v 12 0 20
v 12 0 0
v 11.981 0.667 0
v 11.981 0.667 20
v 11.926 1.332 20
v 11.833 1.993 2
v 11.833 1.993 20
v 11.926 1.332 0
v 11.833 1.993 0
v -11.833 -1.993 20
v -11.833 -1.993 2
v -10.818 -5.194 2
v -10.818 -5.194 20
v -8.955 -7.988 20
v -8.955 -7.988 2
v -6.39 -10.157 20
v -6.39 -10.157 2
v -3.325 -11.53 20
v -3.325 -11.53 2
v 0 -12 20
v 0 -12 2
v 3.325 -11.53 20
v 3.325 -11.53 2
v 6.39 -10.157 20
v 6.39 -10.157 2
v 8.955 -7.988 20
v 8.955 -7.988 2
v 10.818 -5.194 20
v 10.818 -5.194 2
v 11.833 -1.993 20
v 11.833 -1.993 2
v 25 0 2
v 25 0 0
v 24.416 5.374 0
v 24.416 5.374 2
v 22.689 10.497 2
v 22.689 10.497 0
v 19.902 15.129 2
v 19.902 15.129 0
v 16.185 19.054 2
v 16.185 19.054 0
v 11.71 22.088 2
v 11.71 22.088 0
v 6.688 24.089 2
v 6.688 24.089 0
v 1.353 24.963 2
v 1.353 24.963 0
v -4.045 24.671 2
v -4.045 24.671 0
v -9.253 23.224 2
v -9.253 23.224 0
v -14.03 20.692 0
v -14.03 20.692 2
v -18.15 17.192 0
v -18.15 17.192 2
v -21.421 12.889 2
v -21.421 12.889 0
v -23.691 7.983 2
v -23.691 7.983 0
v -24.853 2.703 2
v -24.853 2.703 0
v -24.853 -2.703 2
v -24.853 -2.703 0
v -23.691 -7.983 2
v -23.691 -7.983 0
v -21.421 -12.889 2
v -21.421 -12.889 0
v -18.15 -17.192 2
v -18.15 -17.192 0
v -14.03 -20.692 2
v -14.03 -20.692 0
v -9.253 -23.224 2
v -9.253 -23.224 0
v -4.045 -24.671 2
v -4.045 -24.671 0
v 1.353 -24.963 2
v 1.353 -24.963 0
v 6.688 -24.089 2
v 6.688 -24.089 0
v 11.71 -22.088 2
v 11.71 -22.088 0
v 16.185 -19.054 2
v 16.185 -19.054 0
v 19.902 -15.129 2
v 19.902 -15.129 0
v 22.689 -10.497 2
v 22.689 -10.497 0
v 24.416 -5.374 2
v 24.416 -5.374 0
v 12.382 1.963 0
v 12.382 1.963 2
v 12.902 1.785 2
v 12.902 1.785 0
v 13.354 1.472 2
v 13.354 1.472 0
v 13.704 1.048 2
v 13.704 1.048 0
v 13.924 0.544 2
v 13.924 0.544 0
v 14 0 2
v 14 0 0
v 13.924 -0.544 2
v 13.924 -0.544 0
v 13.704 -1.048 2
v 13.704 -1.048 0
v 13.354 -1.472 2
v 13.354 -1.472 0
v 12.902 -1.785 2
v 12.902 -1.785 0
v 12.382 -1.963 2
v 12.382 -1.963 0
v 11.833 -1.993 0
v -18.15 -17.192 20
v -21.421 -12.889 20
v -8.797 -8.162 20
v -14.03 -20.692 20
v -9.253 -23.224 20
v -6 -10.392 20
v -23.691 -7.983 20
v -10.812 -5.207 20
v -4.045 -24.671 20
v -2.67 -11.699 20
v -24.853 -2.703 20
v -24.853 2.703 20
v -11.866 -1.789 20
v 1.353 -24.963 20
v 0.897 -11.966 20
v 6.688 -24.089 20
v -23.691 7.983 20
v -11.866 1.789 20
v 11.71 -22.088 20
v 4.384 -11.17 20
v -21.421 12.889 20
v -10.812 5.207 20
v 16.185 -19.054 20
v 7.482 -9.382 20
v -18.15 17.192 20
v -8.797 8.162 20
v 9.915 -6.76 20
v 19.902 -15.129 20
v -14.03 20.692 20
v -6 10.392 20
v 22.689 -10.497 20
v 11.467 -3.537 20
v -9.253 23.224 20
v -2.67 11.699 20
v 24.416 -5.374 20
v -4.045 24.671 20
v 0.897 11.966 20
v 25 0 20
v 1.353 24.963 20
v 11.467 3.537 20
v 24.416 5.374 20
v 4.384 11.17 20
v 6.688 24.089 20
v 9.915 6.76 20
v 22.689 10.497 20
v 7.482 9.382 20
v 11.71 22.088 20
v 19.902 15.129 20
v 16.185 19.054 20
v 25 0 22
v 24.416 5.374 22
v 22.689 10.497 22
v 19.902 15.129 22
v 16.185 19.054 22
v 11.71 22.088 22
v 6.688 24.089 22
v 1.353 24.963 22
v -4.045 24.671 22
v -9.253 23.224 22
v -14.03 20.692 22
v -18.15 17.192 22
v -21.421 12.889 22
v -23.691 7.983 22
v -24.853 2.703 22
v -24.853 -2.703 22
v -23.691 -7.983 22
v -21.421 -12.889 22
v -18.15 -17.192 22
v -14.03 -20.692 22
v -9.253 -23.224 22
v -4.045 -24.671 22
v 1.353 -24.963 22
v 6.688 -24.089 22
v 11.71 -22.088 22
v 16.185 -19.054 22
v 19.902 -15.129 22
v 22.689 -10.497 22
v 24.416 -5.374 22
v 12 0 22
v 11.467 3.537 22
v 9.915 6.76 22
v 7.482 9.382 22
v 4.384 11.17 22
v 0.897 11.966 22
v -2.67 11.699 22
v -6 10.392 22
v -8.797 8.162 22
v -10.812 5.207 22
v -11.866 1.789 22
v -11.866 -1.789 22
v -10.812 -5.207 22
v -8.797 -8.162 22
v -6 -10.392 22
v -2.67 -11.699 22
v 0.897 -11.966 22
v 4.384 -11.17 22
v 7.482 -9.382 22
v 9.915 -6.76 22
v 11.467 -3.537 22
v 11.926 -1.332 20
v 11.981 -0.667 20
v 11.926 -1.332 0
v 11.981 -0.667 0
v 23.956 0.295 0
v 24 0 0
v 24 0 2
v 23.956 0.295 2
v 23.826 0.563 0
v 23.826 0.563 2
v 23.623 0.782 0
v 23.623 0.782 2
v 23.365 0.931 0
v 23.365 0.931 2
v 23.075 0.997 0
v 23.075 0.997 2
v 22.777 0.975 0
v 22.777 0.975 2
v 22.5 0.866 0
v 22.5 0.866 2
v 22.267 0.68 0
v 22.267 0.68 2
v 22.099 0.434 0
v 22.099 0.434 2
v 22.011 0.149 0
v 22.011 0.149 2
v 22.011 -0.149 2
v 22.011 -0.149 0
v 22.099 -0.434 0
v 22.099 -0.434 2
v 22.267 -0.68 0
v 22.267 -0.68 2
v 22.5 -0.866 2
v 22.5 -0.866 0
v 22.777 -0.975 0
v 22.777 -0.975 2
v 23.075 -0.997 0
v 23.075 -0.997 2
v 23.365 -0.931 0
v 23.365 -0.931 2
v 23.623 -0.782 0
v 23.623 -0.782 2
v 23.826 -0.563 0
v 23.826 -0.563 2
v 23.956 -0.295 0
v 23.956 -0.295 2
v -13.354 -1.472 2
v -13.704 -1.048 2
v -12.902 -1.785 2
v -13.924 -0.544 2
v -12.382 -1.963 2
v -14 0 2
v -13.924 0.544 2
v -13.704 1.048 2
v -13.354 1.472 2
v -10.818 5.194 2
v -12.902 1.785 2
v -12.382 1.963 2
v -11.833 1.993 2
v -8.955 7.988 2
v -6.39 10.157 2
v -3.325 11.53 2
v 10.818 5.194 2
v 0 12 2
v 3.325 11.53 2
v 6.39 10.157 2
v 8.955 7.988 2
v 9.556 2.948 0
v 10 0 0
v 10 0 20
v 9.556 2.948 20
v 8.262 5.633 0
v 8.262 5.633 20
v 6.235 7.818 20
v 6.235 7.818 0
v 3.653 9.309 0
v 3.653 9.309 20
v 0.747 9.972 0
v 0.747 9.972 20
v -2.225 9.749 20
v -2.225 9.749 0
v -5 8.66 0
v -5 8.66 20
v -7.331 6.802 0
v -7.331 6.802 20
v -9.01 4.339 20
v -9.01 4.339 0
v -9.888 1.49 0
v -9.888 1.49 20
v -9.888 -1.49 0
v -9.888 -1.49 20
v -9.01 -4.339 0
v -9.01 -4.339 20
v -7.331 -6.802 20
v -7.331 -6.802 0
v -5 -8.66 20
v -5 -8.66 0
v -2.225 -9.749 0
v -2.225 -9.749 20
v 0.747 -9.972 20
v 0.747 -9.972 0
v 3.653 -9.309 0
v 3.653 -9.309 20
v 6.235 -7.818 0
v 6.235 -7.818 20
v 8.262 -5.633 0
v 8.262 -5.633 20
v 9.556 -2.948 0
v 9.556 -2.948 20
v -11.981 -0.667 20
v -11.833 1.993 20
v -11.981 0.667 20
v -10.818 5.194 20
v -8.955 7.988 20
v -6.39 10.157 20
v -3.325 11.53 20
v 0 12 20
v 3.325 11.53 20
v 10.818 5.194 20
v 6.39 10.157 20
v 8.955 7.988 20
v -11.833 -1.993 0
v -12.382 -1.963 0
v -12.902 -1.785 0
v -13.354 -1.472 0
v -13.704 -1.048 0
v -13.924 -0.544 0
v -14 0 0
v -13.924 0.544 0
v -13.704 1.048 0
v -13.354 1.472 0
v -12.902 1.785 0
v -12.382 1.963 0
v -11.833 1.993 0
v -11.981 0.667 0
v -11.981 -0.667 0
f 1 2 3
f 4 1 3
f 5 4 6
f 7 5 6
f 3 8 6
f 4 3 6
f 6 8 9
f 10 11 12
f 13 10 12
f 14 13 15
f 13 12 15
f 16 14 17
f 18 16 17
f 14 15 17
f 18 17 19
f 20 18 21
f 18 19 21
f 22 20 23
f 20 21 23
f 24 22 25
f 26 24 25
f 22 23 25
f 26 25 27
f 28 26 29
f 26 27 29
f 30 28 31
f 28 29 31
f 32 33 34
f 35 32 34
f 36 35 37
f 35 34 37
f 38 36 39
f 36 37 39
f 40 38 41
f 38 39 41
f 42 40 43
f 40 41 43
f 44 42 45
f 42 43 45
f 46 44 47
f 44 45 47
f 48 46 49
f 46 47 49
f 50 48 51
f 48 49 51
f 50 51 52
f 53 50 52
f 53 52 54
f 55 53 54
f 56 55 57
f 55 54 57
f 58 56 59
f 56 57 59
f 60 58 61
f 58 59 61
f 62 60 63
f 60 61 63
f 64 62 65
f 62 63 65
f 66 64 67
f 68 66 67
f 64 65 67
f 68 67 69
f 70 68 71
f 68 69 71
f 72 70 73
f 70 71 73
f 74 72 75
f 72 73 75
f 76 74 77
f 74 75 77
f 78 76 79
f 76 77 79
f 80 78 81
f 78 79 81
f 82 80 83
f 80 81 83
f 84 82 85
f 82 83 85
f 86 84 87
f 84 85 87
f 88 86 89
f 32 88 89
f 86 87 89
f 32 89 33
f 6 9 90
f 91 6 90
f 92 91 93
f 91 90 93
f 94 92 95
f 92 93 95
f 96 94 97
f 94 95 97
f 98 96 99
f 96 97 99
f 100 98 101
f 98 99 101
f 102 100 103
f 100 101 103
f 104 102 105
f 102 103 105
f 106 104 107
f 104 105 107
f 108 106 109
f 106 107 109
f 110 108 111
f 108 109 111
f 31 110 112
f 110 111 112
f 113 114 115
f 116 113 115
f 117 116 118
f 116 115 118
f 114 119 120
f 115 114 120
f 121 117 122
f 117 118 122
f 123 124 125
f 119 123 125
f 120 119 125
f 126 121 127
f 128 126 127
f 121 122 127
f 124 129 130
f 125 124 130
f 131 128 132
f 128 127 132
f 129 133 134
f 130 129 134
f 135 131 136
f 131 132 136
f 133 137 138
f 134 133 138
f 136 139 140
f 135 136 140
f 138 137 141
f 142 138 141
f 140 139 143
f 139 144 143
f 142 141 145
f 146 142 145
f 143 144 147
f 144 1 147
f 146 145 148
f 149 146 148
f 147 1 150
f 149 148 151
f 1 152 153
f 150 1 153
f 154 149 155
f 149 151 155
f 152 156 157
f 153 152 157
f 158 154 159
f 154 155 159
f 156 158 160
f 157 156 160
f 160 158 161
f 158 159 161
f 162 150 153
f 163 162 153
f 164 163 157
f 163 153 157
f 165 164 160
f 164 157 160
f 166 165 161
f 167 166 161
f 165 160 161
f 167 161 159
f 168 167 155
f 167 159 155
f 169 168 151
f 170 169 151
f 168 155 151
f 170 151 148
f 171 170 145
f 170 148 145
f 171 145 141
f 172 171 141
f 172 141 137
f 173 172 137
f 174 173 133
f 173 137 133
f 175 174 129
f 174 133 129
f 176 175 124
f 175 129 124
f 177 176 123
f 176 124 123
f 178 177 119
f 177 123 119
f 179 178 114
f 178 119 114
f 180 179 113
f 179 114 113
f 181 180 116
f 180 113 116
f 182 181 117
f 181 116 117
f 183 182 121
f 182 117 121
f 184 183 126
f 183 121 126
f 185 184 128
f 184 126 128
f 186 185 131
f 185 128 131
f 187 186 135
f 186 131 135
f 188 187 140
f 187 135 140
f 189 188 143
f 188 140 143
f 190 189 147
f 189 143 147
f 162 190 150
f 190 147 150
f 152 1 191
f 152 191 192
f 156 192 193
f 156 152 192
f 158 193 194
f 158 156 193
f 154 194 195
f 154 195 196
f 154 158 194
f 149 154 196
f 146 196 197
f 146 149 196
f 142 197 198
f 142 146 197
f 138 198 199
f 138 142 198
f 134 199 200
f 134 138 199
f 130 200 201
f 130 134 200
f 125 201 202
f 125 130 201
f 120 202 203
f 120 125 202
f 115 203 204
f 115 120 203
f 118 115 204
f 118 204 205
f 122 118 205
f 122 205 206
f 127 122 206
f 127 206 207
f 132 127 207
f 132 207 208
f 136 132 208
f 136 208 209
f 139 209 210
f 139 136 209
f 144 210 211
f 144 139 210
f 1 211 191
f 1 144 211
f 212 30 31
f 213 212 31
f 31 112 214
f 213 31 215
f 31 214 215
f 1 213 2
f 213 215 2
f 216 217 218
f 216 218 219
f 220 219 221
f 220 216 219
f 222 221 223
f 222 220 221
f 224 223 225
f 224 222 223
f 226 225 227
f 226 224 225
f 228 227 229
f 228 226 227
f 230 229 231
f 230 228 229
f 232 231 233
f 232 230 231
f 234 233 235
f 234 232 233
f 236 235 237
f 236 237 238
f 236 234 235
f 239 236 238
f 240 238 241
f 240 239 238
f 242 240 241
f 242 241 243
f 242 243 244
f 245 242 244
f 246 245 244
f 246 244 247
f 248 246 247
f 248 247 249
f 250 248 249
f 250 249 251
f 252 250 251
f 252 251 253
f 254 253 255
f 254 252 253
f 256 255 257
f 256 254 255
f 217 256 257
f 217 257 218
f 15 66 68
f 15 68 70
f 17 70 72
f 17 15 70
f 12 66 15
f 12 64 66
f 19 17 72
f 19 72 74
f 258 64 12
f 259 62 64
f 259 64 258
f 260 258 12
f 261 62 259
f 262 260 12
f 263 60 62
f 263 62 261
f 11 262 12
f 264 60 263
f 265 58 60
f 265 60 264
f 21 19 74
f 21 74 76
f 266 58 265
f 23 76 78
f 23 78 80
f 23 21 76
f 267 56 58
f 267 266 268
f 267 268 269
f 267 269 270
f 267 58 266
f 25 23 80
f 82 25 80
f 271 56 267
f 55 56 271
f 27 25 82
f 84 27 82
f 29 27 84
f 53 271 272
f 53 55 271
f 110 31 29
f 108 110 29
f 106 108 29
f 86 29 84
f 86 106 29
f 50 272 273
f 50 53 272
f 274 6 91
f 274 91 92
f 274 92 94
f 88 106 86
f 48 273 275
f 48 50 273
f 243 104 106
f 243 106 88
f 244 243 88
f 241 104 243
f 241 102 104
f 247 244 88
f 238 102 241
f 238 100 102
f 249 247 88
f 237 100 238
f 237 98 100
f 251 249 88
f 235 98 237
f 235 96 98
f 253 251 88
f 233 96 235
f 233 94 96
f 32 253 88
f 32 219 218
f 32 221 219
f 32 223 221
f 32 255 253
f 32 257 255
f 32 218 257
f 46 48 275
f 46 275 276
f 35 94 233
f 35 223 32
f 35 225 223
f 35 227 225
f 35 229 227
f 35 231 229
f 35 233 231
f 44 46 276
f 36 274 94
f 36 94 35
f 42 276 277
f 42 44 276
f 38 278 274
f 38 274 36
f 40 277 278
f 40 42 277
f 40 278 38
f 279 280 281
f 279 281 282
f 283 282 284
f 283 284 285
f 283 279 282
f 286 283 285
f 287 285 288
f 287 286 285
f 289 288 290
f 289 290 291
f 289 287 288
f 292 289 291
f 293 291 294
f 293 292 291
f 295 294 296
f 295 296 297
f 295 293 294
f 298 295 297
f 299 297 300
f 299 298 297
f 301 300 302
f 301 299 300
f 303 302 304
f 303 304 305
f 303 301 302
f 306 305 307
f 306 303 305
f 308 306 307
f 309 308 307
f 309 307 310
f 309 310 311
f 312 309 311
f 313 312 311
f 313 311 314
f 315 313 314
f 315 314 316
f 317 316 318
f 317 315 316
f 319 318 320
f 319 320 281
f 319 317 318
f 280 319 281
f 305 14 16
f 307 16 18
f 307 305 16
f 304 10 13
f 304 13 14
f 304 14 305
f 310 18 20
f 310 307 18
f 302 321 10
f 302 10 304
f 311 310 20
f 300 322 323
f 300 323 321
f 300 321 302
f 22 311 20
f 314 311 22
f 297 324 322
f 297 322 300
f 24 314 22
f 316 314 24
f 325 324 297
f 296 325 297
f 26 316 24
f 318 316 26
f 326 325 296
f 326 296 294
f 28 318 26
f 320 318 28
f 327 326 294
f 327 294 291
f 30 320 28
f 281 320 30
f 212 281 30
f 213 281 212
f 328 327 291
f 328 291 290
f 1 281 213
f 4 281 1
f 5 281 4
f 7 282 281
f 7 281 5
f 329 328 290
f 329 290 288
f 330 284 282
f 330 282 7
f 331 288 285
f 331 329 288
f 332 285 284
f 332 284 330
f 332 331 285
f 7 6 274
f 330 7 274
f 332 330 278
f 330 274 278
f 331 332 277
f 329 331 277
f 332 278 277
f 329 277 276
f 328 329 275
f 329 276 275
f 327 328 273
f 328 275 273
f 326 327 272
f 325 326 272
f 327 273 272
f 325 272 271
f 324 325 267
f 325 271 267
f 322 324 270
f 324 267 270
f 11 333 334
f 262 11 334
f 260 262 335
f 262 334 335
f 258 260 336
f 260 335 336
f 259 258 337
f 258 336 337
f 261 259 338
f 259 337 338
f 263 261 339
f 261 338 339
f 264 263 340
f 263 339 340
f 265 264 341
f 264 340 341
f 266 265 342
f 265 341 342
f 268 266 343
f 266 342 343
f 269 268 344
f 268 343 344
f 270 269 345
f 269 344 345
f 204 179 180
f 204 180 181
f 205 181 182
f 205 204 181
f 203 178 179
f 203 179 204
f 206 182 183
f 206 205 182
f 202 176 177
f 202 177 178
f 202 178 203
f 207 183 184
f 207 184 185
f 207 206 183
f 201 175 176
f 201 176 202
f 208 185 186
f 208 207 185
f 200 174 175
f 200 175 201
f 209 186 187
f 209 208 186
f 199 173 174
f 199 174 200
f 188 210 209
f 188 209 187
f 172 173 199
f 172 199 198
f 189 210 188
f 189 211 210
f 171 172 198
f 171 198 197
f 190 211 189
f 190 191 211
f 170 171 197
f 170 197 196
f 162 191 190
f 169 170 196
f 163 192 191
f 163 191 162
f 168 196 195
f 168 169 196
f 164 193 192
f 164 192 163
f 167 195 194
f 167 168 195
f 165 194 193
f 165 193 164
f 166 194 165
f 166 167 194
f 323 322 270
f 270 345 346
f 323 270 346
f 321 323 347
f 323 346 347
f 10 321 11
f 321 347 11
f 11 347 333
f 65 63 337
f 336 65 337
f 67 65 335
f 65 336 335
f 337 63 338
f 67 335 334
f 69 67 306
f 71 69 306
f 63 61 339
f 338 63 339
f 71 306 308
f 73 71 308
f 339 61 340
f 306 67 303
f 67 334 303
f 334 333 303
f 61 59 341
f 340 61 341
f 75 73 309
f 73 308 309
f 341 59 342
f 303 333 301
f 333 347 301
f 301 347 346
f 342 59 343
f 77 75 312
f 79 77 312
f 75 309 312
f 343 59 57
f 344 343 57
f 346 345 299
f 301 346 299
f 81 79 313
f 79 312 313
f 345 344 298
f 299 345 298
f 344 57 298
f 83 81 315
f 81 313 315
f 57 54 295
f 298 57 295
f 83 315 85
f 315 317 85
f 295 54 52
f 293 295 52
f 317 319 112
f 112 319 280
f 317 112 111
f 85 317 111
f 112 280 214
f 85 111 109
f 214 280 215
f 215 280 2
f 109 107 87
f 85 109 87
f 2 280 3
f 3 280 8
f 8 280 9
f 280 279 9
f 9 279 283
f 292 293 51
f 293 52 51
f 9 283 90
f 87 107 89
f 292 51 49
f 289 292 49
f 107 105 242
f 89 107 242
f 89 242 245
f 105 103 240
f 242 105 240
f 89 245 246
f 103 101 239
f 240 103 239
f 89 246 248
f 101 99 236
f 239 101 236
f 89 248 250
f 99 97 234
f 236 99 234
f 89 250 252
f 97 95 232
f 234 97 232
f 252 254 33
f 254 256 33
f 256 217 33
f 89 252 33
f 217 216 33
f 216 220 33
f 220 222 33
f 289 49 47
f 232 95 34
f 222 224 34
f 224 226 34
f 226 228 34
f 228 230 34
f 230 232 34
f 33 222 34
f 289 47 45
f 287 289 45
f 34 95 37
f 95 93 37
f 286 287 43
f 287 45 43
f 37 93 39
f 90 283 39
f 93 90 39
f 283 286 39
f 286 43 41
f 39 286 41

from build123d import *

# Parameters (mm, degrees)
F0_R     = 25
F0_R_2   = 1
F1_DEPTH = 2
F0_R_3   = 10
F2_DEPTH = 20
F3_R     = 25
F3_R_2   = 12
F4_DEPTH = 2


with BuildPart() as f1:
    # F0 (on Top) → F1 (new body)
    with BuildSketch(Plane.XY):
        Circle(F0_R)
        with BuildLine():
            ThreePointArc((-11.833333, 1.993043), (0, 12), (11.833333, 1.993043))
            ThreePointArc((11.833333, 1.993043), (14, 0), (11.833333, -1.993043))
            ThreePointArc((11.833333, -1.993043), (0, -12), (-11.833333, -1.993043))
            ThreePointArc((-11.833333, -1.993043), (-14, 0), (-11.833333, 1.993043))
        make_face(mode=Mode.SUBTRACT)
        with Locations((23, 0)):
            Circle(F0_R_2, mode=Mode.SUBTRACT)
    extrude(amount=F1_DEPTH)

    # F0 (on Top) → F2 (join)
    with BuildSketch(Plane.XY):
        with BuildLine():
            ThreePointArc((11.833333, -1.993043), (11.958261, -1), (12, 0))
            ThreePointArc((12, 0), (11.958261, 1), (11.833333, 1.993043))
            ThreePointArc((11.833333, 1.993043), (0, 12), (-11.833333, 1.993043))
            ThreePointArc((-11.833333, 1.993043), (-12, 0), (-11.833333, -1.993043))
            ThreePointArc((-11.833333, -1.993043), (0, -12), (11.833333, -1.993043))
        make_face()
        Circle(F0_R_3, mode=Mode.SUBTRACT)
    extrude(amount=F2_DEPTH)


with BuildPart() as f4:
    # F3 (on face) → F4 (new body)
    with BuildSketch(Plane.XY.offset(20)):
        Circle(F3_R)
        Circle(F3_R_2, mode=Mode.SUBTRACT)
    extrude(amount=F4_DEPTH)


solid = Compound([f1.part, f4.part])
